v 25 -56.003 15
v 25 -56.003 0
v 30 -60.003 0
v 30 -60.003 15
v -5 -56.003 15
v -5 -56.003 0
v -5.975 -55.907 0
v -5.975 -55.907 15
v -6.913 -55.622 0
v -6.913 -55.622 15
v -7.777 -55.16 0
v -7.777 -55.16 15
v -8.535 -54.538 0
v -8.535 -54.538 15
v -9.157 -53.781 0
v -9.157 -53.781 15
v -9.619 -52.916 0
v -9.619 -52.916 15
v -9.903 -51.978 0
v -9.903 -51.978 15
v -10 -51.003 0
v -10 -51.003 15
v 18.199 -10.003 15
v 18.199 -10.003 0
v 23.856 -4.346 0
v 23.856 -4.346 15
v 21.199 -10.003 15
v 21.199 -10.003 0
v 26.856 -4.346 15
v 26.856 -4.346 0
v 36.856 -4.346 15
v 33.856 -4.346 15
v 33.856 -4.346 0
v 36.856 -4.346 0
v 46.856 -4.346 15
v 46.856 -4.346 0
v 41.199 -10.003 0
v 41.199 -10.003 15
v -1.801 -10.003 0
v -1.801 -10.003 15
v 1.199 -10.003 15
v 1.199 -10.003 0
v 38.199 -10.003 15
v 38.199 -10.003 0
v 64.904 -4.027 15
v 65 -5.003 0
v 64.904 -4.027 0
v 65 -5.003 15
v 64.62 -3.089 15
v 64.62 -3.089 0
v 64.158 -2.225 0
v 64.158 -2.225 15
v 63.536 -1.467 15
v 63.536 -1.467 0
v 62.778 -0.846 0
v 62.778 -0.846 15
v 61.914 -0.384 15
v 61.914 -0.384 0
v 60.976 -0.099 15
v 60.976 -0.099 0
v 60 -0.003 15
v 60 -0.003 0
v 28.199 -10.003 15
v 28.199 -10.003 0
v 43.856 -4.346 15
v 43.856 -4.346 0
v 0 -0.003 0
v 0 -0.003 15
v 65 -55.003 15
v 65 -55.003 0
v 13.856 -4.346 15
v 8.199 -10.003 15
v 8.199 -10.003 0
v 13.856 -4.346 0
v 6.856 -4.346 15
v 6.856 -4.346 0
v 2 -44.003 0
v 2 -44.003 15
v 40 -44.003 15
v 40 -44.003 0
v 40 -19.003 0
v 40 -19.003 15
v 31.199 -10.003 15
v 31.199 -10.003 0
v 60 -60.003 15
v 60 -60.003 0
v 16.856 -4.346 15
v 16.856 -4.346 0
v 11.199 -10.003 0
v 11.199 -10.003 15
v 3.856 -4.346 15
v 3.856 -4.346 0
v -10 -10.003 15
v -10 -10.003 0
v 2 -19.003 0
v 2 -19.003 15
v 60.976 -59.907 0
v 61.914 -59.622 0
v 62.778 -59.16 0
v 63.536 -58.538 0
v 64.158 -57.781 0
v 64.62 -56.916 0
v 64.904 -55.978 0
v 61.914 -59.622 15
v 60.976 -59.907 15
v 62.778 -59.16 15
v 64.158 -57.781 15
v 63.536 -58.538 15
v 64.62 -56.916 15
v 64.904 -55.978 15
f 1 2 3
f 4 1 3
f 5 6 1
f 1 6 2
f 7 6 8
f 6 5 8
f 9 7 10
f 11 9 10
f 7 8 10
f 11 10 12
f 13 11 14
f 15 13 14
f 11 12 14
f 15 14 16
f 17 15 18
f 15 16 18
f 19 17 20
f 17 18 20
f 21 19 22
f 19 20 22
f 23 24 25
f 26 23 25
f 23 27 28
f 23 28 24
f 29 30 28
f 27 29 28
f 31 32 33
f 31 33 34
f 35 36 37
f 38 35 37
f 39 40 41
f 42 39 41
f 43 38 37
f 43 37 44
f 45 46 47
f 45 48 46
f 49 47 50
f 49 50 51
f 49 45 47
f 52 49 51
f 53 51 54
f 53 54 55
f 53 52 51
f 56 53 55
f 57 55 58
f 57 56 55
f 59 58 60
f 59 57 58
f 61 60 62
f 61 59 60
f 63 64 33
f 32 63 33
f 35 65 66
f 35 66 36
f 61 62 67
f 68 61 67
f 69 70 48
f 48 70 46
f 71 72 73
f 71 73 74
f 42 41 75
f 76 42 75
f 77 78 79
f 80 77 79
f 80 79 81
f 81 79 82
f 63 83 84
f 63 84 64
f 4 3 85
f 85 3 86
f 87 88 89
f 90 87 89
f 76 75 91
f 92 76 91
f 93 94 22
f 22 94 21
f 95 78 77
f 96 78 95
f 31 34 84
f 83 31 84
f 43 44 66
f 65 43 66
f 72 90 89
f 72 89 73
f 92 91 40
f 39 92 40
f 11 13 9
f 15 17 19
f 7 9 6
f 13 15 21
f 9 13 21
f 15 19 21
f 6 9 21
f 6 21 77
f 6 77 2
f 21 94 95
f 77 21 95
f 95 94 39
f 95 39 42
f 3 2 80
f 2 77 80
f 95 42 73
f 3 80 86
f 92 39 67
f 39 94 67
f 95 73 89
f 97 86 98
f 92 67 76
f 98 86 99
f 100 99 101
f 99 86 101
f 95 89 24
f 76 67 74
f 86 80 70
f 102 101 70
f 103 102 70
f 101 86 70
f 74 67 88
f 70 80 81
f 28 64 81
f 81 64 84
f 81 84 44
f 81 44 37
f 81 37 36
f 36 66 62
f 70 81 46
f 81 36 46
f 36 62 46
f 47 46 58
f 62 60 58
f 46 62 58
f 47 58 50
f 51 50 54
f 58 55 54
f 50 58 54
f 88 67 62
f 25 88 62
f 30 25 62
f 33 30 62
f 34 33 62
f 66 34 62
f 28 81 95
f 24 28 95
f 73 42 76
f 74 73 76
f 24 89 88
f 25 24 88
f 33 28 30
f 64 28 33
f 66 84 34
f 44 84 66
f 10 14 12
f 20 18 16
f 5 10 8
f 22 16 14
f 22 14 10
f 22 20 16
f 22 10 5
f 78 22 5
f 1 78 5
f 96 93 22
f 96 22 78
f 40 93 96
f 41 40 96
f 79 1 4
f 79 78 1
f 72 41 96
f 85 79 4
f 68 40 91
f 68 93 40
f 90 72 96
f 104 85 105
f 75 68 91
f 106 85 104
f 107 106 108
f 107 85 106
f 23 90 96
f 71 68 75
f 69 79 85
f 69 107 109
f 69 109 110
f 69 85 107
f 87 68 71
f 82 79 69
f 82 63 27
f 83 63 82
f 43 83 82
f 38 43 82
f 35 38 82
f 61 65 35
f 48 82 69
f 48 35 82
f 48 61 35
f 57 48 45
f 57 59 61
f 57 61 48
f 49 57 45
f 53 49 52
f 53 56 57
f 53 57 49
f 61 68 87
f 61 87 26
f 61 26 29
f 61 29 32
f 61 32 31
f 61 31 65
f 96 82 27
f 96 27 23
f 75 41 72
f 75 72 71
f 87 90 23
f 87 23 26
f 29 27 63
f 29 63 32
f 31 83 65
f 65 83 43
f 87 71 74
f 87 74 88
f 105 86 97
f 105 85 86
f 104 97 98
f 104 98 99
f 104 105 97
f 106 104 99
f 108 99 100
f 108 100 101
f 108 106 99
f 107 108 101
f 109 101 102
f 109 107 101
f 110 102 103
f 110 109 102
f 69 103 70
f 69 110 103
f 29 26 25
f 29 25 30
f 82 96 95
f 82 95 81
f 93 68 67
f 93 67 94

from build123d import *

# Parameters (mm, degrees)
EXTRUDE_1_DEPTH     = 15
FILLET_1_R          = 5
CUT_EXTRUDE_1_DEPTH = 90.724081338
SKETCH_4_W          = 38
SKETCH_4_H          = 25
CUT_EXTRUDE_2_DEPTH = 90.724081338


with BuildPart() as part:
    # 草图1 → 凸台-拉伸1 (new body)
    with BuildSketch(Plane.XY):
        Polygon((-9.999515105, -56.002897725), (25.000484895, -56.002897725), (30.000484895, -60.002897725), (65.000484895, -60.002897725), (65.000484895, -0.002897725), (0.000484895, -0.002897725), (-9.999515105, -10.002897725), align=None)
    extrude(amount=EXTRUDE_1_DEPTH)

    # 圆角1
    fillet_1_edges = [part.edges().sort_by_distance(p)[0] for p in [
        (-9.999515105, -56.002897725, 7.5),
        (65.000484895, -0.002897725, 7.5),
        (65.000484895, -60.002897725, 7.5),
    ]]
    fillet(fillet_1_edges, radius=FILLET_1_R)

    # 草图3 → 切除-拉伸1 (cut, through all)
    with BuildSketch(Plane.XY.offset(15)):
        Polygon((3.856343928, -4.346043475), (-1.800510321, -10.002897725), (1.199489679, -10.002897725), (6.856343928, -4.346043475), align=None)
        Polygon((16.856343928, -4.346043475), (11.199489679, -10.002897725), (8.199489679, -10.002897725), (13.856343928, -4.346043475), align=None)
        Polygon((26.856343928, -4.346043475), (21.199489679, -10.002897725), (18.199489679, -10.002897725), (23.856343928, -4.346043475), align=None)
        Polygon((36.856343928, -4.346043475), (31.199489679, -10.002897725), (28.199489679, -10.002897725), (33.856343928, -4.346043475), align=None)
        Polygon((46.856343928, -4.346043475), (41.199489679, -10.002897725), (38.199489679, -10.002897725), (43.856343928, -4.346043475), align=None)
    extrude(amount=-CUT_EXTRUDE_1_DEPTH, mode=Mode.SUBTRACT)

    # 草图4 → 切除-拉伸2 (cut, through all)
    with BuildSketch(Plane.XY.offset(15)):
        with Locations((21.000484895, -31.502897725)):
            Rectangle(SKETCH_4_W, SKETCH_4_H)
    extrude(amount=-CUT_EXTRUDE_2_DEPTH, mode=Mode.SUBTRACT)


solid = part.part
